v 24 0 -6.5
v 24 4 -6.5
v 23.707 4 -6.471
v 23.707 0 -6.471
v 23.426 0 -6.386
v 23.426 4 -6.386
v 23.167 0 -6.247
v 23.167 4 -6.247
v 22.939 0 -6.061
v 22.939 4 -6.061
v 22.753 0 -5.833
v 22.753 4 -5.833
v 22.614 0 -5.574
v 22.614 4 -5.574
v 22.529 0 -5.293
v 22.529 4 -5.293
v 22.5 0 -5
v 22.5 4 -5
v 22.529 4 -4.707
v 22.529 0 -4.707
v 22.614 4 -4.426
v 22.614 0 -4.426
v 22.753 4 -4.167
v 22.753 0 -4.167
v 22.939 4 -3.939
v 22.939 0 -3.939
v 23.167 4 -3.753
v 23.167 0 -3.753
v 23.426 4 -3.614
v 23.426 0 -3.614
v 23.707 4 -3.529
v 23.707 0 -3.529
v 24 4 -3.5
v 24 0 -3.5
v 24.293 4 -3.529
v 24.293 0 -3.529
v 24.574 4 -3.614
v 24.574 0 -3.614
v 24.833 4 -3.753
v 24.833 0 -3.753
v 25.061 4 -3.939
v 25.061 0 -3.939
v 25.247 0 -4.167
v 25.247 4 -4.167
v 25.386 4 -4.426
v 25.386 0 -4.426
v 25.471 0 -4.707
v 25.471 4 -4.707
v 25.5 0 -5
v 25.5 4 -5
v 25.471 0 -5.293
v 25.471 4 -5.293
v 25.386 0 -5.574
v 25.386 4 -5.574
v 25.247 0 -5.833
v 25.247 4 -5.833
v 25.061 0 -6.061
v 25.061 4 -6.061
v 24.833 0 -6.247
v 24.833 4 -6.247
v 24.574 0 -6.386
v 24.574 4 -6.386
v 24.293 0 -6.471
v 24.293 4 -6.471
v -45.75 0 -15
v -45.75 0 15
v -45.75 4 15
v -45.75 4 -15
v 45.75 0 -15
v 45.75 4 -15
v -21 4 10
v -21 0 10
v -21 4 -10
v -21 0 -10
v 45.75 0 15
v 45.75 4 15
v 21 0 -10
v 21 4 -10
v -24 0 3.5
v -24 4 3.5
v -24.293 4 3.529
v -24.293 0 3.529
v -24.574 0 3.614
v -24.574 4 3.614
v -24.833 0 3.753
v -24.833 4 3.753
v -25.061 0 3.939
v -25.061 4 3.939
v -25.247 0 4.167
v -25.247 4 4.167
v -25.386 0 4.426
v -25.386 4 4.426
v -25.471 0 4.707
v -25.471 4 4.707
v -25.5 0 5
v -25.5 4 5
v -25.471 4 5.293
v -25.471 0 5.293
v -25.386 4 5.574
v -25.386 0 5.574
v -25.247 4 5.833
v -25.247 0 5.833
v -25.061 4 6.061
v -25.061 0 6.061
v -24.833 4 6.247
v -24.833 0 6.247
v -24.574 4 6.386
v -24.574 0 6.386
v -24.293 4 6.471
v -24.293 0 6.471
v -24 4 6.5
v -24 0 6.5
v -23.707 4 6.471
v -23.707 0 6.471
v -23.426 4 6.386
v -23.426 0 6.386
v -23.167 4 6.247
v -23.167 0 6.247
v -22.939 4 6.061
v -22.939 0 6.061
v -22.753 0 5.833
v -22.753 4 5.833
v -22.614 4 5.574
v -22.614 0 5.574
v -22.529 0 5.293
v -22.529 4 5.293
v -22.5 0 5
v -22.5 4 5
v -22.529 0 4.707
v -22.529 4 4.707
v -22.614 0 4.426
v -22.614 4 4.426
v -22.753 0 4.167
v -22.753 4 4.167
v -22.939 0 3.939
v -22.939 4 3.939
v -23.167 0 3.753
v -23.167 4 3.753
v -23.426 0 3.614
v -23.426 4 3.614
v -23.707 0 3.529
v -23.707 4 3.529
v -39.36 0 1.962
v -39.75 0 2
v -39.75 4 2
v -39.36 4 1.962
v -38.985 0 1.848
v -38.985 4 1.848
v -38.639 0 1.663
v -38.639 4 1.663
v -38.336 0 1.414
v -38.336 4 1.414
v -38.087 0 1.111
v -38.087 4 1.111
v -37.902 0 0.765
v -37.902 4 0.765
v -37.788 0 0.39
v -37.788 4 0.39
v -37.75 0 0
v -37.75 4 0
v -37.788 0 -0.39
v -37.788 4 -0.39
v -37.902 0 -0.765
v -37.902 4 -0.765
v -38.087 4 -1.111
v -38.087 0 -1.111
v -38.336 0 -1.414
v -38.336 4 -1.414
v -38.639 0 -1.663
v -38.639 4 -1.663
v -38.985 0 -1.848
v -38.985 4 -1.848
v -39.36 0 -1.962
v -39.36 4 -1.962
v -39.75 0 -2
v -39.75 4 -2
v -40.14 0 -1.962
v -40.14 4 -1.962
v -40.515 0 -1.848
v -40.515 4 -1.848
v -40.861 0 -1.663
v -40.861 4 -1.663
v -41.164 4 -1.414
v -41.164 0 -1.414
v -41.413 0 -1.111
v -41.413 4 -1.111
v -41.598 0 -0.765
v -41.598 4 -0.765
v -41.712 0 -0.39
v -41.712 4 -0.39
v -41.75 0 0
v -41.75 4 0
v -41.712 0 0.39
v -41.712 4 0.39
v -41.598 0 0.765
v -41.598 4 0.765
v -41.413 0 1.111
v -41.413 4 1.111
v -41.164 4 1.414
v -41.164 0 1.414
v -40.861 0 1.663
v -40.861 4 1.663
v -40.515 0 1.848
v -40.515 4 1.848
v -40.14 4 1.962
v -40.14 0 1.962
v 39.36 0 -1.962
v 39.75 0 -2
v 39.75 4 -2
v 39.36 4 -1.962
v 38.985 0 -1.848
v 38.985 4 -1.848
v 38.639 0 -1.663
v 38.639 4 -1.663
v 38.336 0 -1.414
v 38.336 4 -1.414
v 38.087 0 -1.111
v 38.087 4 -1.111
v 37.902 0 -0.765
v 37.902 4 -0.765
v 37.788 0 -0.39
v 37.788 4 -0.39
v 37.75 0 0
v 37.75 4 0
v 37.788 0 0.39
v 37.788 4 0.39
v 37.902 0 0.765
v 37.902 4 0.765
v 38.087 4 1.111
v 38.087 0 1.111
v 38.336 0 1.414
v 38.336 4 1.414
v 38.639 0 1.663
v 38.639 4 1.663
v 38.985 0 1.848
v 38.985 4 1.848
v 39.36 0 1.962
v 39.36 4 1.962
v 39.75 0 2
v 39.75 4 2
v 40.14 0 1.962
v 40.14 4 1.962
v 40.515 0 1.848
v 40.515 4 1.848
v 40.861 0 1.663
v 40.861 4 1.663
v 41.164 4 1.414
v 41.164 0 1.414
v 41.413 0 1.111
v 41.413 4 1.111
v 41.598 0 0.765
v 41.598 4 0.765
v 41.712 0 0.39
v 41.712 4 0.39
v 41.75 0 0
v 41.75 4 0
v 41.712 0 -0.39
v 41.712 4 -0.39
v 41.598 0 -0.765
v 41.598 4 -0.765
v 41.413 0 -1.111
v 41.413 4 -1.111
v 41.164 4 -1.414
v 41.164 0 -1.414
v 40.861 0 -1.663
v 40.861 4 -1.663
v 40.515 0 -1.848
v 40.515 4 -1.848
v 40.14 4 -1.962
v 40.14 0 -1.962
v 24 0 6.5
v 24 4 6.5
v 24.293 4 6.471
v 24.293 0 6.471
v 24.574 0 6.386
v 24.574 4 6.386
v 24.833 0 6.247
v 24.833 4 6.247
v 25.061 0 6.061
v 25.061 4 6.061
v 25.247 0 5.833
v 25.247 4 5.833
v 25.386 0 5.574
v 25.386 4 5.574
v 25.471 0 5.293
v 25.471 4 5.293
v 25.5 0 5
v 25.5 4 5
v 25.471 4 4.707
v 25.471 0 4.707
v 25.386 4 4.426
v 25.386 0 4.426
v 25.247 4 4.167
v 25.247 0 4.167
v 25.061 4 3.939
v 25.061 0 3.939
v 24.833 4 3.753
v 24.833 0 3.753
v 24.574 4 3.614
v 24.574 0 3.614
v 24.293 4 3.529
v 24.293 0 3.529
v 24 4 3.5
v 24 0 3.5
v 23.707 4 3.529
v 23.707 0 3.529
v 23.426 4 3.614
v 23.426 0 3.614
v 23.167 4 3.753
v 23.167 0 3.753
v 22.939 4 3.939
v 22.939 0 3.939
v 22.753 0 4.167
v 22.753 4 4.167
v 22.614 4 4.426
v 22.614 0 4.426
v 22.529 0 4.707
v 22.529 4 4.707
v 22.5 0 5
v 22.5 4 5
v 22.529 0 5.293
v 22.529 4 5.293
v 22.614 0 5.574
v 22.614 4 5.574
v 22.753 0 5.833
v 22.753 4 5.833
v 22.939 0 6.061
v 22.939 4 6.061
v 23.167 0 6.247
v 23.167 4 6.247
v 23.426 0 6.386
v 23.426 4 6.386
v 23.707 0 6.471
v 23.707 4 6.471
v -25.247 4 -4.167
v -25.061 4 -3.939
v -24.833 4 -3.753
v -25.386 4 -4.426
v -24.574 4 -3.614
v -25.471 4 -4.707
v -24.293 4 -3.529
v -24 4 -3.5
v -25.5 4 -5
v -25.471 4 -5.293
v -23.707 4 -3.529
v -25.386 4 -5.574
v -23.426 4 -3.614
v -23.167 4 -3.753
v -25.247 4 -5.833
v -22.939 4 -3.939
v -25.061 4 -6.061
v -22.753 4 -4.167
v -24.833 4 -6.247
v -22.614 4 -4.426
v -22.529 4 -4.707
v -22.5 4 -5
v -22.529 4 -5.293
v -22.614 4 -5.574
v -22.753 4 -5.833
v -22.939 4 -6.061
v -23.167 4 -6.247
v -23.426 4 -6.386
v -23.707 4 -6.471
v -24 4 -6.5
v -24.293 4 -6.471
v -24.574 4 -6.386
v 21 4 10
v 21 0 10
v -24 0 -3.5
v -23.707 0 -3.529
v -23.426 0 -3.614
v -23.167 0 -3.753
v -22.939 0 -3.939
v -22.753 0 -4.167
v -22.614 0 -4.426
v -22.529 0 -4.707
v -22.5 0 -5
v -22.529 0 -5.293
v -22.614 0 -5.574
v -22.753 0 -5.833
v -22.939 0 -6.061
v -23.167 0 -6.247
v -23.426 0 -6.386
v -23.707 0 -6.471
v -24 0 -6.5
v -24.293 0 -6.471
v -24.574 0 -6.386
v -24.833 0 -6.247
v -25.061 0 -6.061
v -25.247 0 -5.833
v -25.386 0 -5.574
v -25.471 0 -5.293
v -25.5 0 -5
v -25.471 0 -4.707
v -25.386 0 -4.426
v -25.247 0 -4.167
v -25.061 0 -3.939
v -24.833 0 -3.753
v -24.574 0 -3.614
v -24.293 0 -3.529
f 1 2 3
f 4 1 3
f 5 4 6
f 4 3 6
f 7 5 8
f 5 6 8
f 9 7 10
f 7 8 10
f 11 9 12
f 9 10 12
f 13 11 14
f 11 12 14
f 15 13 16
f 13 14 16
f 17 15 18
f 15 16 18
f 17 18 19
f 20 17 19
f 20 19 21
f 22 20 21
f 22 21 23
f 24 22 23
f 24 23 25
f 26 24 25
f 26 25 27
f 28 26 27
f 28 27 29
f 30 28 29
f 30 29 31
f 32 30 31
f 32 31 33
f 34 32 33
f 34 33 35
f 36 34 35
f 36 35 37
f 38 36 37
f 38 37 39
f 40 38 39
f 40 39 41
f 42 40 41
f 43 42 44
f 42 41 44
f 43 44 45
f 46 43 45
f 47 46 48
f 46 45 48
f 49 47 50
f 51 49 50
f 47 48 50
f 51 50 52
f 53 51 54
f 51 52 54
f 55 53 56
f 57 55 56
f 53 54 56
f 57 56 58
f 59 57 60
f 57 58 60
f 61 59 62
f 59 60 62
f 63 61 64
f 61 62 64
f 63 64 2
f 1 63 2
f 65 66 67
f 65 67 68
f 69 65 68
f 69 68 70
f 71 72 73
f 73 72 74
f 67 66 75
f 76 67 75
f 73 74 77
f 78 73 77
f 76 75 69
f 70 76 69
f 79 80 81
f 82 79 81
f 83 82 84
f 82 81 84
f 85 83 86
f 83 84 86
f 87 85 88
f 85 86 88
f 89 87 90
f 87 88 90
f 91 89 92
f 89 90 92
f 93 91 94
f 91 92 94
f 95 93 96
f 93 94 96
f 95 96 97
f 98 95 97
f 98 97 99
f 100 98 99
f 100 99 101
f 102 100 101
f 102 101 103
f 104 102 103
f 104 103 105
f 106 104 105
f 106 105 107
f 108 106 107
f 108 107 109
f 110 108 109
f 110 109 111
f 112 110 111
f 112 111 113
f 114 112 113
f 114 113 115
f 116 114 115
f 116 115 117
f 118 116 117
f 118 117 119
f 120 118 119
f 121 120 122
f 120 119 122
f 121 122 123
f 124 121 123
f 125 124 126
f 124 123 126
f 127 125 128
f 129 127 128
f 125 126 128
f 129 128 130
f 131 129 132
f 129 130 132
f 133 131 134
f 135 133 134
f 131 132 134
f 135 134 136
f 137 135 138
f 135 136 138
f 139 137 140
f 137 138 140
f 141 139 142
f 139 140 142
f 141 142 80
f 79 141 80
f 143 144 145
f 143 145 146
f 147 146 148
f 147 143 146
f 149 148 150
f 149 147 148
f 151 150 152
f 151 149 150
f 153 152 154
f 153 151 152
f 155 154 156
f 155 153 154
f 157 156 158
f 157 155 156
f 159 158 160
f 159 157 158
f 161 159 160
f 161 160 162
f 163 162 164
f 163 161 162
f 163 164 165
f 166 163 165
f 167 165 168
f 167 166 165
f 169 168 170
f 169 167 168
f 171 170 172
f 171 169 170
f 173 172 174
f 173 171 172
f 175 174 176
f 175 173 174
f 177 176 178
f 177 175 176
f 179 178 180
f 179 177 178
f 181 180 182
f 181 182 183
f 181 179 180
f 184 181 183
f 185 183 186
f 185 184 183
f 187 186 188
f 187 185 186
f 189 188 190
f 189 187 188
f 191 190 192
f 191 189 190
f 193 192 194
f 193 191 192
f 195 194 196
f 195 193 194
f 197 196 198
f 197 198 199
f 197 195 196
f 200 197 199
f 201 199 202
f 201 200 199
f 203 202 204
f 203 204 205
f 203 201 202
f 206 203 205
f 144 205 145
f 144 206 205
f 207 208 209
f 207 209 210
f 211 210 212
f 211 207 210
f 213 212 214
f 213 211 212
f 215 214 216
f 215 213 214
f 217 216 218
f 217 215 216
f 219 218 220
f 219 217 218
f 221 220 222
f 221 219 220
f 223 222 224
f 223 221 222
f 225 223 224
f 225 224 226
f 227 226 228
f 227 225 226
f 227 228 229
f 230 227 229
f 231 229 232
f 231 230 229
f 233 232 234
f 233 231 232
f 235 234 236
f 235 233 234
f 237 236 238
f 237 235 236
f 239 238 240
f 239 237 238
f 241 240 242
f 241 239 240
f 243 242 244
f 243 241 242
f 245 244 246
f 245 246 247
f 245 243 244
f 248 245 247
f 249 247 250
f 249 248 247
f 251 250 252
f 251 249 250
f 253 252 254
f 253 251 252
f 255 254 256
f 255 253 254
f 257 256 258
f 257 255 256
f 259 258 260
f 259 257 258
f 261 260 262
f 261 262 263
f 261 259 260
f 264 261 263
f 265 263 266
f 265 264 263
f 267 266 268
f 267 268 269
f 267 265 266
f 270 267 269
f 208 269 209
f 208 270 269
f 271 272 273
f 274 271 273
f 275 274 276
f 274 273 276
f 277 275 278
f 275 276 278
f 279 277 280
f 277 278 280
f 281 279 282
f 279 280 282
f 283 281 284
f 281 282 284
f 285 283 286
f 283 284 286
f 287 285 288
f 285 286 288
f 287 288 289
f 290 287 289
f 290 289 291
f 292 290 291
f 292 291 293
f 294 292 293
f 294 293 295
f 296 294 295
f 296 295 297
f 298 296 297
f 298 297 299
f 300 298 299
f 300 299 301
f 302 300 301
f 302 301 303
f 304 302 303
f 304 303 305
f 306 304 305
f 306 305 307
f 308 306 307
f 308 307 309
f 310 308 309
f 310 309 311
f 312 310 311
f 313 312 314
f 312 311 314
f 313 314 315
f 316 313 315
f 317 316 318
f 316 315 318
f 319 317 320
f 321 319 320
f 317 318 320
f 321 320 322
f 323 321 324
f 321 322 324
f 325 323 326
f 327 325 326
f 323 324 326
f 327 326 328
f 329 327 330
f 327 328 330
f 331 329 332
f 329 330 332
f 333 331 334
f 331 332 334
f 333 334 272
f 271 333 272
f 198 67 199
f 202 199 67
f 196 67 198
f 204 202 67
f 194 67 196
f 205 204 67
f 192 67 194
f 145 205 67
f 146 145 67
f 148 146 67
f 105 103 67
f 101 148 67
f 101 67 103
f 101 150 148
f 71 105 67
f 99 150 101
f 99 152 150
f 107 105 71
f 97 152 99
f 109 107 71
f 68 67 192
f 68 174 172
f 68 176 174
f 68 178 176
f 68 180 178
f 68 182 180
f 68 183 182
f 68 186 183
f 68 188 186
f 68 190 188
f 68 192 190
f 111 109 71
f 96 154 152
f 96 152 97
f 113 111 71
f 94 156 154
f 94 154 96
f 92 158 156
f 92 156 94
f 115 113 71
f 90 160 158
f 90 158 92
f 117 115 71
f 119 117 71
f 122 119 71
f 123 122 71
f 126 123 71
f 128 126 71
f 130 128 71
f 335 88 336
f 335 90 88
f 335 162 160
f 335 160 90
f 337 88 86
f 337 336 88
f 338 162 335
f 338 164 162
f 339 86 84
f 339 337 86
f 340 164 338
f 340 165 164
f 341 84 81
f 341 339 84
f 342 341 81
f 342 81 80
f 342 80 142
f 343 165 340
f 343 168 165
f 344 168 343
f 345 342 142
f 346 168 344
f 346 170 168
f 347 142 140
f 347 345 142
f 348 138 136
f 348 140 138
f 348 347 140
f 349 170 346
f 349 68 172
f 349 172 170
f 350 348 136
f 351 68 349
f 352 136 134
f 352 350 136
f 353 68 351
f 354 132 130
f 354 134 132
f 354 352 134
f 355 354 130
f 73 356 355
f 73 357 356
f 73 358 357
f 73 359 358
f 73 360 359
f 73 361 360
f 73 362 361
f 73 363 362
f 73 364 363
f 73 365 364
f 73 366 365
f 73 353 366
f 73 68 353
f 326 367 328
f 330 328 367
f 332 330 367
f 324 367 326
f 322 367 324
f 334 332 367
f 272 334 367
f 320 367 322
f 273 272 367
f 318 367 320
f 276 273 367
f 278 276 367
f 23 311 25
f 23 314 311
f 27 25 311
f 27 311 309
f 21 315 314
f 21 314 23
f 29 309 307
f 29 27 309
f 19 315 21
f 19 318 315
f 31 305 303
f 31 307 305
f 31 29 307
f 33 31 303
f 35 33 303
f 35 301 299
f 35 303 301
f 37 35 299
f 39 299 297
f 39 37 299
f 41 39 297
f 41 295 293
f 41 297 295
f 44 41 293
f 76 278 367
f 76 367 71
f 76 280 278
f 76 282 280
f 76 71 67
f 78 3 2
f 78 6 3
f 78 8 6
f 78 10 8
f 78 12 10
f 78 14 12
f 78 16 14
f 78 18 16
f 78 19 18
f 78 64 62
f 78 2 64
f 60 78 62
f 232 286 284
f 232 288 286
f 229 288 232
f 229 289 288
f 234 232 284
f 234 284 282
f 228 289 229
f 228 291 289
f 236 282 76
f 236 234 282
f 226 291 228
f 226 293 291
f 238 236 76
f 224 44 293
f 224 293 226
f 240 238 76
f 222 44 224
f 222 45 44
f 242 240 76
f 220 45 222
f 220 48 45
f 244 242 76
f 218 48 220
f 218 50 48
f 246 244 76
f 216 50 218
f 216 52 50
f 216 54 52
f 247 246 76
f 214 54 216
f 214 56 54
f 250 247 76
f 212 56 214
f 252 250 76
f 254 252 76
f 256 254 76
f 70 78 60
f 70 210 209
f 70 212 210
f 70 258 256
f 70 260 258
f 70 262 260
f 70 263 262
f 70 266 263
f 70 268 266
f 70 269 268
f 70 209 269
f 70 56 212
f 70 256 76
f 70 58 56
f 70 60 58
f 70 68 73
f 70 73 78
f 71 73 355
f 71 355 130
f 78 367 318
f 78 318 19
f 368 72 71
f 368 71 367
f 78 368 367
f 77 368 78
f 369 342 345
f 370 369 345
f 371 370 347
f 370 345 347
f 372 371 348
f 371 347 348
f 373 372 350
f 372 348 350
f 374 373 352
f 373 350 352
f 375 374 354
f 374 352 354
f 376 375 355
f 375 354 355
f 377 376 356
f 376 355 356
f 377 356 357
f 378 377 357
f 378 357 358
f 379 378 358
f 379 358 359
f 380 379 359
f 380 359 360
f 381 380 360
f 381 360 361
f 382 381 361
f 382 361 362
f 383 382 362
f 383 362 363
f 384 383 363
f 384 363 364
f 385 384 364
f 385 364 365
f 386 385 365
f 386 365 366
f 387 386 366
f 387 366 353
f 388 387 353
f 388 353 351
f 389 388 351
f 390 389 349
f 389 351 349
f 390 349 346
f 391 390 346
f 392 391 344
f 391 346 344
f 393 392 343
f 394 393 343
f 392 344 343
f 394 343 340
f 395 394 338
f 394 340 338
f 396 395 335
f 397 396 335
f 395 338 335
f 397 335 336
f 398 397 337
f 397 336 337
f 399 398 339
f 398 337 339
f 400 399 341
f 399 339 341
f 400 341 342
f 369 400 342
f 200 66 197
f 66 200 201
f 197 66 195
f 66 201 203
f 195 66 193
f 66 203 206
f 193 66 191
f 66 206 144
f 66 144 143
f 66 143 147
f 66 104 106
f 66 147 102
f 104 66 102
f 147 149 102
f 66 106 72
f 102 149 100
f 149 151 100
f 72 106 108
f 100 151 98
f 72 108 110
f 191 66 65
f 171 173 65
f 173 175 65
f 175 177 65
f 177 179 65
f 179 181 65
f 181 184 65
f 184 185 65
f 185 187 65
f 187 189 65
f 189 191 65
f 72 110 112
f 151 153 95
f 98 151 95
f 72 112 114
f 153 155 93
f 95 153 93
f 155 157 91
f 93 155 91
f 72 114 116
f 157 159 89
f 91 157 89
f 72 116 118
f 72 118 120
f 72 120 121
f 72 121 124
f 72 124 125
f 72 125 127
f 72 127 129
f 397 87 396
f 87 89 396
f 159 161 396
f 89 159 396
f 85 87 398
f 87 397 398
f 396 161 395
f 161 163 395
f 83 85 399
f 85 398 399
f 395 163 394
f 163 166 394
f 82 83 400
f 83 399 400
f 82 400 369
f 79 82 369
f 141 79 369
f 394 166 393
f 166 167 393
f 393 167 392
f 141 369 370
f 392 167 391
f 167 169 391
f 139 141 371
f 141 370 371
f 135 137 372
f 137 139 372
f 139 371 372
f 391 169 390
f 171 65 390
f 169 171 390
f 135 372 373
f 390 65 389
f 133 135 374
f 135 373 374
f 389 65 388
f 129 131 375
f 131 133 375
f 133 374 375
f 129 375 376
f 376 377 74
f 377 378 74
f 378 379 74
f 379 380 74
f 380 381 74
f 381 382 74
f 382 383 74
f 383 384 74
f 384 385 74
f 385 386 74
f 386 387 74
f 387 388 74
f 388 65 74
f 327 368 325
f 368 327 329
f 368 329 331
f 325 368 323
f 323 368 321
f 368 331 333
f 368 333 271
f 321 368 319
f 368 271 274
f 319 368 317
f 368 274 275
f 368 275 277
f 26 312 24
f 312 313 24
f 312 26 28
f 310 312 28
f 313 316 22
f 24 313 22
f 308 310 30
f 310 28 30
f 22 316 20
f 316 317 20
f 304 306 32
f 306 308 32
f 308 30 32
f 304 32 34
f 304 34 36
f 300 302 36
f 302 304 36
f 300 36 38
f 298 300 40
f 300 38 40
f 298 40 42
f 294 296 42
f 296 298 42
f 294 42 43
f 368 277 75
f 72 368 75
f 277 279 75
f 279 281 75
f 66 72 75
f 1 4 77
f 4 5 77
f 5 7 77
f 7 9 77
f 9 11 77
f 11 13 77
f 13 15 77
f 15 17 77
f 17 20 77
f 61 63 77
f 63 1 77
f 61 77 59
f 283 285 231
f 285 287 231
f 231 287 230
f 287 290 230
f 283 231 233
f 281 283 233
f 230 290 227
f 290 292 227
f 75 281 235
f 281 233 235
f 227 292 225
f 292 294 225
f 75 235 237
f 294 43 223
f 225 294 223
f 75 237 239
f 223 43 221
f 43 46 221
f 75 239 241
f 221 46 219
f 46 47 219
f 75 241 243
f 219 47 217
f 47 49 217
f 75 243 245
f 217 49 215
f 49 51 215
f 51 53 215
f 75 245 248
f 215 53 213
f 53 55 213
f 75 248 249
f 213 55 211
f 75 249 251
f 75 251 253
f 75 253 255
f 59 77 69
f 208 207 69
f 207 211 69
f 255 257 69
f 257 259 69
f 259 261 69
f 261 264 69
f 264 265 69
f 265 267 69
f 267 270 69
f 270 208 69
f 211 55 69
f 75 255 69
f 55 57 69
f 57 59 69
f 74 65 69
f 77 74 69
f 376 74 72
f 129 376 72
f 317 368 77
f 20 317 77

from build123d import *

# Parameters (mm, degrees)
SKETCH1_W           = 91.5
SKETCH1_H           = 30
SKETCH1_R           = 2
SKETCH1_W_2         = 42
SKETCH1_H_2         = 20
BOSS_EXTRUDE1_DEPTH = 4
SKETCH2_R           = 1.5
CUT_EXTRUDE1_DEPTH  = 49.312136156


with BuildPart() as part:
    # Sketch1 → Boss-Extrude1 (new body)
    with BuildSketch(Plane(origin=(0, 0, 0), x_dir=(1, 0, 0), z_dir=(0, 1, 0))):
        Rectangle(SKETCH1_W, SKETCH1_H)
        with Locations(Location((-39.75, 0, 0), (0, 0, 270))):
            Circle(SKETCH1_R, mode=Mode.SUBTRACT)
        with Locations(Location((39.75, 0, 0), (0, 0, 90))):
            Circle(SKETCH1_R, mode=Mode.SUBTRACT)
        Rectangle(SKETCH1_W_2, SKETCH1_H_2, mode=Mode.SUBTRACT)
    extrude(amount=BOSS_EXTRUDE1_DEPTH)

    # Sketch2 → Cut-Extrude1 (cut, through all)
    with BuildSketch(Plane(origin=(0, 4, 0), x_dir=(1, 0, 0), z_dir=(0, 1, 0))):
        with Locations(Location((-24, 5, 0), (0, 0, 270))):
            Circle(SKETCH2_R)
        with Locations(Location((-24, -5, 0), (0, 0, 90))):
            Circle(SKETCH2_R)
        with Locations(Location((24, -5, 0), (0, 0, 270))):
            Circle(SKETCH2_R)
        with Locations(Location((24, 5, 0), (0, 0, 90))):
            Circle(SKETCH2_R)
    extrude(amount=-CUT_EXTRUDE1_DEPTH, mode=Mode.SUBTRACT)


solid = part.part
